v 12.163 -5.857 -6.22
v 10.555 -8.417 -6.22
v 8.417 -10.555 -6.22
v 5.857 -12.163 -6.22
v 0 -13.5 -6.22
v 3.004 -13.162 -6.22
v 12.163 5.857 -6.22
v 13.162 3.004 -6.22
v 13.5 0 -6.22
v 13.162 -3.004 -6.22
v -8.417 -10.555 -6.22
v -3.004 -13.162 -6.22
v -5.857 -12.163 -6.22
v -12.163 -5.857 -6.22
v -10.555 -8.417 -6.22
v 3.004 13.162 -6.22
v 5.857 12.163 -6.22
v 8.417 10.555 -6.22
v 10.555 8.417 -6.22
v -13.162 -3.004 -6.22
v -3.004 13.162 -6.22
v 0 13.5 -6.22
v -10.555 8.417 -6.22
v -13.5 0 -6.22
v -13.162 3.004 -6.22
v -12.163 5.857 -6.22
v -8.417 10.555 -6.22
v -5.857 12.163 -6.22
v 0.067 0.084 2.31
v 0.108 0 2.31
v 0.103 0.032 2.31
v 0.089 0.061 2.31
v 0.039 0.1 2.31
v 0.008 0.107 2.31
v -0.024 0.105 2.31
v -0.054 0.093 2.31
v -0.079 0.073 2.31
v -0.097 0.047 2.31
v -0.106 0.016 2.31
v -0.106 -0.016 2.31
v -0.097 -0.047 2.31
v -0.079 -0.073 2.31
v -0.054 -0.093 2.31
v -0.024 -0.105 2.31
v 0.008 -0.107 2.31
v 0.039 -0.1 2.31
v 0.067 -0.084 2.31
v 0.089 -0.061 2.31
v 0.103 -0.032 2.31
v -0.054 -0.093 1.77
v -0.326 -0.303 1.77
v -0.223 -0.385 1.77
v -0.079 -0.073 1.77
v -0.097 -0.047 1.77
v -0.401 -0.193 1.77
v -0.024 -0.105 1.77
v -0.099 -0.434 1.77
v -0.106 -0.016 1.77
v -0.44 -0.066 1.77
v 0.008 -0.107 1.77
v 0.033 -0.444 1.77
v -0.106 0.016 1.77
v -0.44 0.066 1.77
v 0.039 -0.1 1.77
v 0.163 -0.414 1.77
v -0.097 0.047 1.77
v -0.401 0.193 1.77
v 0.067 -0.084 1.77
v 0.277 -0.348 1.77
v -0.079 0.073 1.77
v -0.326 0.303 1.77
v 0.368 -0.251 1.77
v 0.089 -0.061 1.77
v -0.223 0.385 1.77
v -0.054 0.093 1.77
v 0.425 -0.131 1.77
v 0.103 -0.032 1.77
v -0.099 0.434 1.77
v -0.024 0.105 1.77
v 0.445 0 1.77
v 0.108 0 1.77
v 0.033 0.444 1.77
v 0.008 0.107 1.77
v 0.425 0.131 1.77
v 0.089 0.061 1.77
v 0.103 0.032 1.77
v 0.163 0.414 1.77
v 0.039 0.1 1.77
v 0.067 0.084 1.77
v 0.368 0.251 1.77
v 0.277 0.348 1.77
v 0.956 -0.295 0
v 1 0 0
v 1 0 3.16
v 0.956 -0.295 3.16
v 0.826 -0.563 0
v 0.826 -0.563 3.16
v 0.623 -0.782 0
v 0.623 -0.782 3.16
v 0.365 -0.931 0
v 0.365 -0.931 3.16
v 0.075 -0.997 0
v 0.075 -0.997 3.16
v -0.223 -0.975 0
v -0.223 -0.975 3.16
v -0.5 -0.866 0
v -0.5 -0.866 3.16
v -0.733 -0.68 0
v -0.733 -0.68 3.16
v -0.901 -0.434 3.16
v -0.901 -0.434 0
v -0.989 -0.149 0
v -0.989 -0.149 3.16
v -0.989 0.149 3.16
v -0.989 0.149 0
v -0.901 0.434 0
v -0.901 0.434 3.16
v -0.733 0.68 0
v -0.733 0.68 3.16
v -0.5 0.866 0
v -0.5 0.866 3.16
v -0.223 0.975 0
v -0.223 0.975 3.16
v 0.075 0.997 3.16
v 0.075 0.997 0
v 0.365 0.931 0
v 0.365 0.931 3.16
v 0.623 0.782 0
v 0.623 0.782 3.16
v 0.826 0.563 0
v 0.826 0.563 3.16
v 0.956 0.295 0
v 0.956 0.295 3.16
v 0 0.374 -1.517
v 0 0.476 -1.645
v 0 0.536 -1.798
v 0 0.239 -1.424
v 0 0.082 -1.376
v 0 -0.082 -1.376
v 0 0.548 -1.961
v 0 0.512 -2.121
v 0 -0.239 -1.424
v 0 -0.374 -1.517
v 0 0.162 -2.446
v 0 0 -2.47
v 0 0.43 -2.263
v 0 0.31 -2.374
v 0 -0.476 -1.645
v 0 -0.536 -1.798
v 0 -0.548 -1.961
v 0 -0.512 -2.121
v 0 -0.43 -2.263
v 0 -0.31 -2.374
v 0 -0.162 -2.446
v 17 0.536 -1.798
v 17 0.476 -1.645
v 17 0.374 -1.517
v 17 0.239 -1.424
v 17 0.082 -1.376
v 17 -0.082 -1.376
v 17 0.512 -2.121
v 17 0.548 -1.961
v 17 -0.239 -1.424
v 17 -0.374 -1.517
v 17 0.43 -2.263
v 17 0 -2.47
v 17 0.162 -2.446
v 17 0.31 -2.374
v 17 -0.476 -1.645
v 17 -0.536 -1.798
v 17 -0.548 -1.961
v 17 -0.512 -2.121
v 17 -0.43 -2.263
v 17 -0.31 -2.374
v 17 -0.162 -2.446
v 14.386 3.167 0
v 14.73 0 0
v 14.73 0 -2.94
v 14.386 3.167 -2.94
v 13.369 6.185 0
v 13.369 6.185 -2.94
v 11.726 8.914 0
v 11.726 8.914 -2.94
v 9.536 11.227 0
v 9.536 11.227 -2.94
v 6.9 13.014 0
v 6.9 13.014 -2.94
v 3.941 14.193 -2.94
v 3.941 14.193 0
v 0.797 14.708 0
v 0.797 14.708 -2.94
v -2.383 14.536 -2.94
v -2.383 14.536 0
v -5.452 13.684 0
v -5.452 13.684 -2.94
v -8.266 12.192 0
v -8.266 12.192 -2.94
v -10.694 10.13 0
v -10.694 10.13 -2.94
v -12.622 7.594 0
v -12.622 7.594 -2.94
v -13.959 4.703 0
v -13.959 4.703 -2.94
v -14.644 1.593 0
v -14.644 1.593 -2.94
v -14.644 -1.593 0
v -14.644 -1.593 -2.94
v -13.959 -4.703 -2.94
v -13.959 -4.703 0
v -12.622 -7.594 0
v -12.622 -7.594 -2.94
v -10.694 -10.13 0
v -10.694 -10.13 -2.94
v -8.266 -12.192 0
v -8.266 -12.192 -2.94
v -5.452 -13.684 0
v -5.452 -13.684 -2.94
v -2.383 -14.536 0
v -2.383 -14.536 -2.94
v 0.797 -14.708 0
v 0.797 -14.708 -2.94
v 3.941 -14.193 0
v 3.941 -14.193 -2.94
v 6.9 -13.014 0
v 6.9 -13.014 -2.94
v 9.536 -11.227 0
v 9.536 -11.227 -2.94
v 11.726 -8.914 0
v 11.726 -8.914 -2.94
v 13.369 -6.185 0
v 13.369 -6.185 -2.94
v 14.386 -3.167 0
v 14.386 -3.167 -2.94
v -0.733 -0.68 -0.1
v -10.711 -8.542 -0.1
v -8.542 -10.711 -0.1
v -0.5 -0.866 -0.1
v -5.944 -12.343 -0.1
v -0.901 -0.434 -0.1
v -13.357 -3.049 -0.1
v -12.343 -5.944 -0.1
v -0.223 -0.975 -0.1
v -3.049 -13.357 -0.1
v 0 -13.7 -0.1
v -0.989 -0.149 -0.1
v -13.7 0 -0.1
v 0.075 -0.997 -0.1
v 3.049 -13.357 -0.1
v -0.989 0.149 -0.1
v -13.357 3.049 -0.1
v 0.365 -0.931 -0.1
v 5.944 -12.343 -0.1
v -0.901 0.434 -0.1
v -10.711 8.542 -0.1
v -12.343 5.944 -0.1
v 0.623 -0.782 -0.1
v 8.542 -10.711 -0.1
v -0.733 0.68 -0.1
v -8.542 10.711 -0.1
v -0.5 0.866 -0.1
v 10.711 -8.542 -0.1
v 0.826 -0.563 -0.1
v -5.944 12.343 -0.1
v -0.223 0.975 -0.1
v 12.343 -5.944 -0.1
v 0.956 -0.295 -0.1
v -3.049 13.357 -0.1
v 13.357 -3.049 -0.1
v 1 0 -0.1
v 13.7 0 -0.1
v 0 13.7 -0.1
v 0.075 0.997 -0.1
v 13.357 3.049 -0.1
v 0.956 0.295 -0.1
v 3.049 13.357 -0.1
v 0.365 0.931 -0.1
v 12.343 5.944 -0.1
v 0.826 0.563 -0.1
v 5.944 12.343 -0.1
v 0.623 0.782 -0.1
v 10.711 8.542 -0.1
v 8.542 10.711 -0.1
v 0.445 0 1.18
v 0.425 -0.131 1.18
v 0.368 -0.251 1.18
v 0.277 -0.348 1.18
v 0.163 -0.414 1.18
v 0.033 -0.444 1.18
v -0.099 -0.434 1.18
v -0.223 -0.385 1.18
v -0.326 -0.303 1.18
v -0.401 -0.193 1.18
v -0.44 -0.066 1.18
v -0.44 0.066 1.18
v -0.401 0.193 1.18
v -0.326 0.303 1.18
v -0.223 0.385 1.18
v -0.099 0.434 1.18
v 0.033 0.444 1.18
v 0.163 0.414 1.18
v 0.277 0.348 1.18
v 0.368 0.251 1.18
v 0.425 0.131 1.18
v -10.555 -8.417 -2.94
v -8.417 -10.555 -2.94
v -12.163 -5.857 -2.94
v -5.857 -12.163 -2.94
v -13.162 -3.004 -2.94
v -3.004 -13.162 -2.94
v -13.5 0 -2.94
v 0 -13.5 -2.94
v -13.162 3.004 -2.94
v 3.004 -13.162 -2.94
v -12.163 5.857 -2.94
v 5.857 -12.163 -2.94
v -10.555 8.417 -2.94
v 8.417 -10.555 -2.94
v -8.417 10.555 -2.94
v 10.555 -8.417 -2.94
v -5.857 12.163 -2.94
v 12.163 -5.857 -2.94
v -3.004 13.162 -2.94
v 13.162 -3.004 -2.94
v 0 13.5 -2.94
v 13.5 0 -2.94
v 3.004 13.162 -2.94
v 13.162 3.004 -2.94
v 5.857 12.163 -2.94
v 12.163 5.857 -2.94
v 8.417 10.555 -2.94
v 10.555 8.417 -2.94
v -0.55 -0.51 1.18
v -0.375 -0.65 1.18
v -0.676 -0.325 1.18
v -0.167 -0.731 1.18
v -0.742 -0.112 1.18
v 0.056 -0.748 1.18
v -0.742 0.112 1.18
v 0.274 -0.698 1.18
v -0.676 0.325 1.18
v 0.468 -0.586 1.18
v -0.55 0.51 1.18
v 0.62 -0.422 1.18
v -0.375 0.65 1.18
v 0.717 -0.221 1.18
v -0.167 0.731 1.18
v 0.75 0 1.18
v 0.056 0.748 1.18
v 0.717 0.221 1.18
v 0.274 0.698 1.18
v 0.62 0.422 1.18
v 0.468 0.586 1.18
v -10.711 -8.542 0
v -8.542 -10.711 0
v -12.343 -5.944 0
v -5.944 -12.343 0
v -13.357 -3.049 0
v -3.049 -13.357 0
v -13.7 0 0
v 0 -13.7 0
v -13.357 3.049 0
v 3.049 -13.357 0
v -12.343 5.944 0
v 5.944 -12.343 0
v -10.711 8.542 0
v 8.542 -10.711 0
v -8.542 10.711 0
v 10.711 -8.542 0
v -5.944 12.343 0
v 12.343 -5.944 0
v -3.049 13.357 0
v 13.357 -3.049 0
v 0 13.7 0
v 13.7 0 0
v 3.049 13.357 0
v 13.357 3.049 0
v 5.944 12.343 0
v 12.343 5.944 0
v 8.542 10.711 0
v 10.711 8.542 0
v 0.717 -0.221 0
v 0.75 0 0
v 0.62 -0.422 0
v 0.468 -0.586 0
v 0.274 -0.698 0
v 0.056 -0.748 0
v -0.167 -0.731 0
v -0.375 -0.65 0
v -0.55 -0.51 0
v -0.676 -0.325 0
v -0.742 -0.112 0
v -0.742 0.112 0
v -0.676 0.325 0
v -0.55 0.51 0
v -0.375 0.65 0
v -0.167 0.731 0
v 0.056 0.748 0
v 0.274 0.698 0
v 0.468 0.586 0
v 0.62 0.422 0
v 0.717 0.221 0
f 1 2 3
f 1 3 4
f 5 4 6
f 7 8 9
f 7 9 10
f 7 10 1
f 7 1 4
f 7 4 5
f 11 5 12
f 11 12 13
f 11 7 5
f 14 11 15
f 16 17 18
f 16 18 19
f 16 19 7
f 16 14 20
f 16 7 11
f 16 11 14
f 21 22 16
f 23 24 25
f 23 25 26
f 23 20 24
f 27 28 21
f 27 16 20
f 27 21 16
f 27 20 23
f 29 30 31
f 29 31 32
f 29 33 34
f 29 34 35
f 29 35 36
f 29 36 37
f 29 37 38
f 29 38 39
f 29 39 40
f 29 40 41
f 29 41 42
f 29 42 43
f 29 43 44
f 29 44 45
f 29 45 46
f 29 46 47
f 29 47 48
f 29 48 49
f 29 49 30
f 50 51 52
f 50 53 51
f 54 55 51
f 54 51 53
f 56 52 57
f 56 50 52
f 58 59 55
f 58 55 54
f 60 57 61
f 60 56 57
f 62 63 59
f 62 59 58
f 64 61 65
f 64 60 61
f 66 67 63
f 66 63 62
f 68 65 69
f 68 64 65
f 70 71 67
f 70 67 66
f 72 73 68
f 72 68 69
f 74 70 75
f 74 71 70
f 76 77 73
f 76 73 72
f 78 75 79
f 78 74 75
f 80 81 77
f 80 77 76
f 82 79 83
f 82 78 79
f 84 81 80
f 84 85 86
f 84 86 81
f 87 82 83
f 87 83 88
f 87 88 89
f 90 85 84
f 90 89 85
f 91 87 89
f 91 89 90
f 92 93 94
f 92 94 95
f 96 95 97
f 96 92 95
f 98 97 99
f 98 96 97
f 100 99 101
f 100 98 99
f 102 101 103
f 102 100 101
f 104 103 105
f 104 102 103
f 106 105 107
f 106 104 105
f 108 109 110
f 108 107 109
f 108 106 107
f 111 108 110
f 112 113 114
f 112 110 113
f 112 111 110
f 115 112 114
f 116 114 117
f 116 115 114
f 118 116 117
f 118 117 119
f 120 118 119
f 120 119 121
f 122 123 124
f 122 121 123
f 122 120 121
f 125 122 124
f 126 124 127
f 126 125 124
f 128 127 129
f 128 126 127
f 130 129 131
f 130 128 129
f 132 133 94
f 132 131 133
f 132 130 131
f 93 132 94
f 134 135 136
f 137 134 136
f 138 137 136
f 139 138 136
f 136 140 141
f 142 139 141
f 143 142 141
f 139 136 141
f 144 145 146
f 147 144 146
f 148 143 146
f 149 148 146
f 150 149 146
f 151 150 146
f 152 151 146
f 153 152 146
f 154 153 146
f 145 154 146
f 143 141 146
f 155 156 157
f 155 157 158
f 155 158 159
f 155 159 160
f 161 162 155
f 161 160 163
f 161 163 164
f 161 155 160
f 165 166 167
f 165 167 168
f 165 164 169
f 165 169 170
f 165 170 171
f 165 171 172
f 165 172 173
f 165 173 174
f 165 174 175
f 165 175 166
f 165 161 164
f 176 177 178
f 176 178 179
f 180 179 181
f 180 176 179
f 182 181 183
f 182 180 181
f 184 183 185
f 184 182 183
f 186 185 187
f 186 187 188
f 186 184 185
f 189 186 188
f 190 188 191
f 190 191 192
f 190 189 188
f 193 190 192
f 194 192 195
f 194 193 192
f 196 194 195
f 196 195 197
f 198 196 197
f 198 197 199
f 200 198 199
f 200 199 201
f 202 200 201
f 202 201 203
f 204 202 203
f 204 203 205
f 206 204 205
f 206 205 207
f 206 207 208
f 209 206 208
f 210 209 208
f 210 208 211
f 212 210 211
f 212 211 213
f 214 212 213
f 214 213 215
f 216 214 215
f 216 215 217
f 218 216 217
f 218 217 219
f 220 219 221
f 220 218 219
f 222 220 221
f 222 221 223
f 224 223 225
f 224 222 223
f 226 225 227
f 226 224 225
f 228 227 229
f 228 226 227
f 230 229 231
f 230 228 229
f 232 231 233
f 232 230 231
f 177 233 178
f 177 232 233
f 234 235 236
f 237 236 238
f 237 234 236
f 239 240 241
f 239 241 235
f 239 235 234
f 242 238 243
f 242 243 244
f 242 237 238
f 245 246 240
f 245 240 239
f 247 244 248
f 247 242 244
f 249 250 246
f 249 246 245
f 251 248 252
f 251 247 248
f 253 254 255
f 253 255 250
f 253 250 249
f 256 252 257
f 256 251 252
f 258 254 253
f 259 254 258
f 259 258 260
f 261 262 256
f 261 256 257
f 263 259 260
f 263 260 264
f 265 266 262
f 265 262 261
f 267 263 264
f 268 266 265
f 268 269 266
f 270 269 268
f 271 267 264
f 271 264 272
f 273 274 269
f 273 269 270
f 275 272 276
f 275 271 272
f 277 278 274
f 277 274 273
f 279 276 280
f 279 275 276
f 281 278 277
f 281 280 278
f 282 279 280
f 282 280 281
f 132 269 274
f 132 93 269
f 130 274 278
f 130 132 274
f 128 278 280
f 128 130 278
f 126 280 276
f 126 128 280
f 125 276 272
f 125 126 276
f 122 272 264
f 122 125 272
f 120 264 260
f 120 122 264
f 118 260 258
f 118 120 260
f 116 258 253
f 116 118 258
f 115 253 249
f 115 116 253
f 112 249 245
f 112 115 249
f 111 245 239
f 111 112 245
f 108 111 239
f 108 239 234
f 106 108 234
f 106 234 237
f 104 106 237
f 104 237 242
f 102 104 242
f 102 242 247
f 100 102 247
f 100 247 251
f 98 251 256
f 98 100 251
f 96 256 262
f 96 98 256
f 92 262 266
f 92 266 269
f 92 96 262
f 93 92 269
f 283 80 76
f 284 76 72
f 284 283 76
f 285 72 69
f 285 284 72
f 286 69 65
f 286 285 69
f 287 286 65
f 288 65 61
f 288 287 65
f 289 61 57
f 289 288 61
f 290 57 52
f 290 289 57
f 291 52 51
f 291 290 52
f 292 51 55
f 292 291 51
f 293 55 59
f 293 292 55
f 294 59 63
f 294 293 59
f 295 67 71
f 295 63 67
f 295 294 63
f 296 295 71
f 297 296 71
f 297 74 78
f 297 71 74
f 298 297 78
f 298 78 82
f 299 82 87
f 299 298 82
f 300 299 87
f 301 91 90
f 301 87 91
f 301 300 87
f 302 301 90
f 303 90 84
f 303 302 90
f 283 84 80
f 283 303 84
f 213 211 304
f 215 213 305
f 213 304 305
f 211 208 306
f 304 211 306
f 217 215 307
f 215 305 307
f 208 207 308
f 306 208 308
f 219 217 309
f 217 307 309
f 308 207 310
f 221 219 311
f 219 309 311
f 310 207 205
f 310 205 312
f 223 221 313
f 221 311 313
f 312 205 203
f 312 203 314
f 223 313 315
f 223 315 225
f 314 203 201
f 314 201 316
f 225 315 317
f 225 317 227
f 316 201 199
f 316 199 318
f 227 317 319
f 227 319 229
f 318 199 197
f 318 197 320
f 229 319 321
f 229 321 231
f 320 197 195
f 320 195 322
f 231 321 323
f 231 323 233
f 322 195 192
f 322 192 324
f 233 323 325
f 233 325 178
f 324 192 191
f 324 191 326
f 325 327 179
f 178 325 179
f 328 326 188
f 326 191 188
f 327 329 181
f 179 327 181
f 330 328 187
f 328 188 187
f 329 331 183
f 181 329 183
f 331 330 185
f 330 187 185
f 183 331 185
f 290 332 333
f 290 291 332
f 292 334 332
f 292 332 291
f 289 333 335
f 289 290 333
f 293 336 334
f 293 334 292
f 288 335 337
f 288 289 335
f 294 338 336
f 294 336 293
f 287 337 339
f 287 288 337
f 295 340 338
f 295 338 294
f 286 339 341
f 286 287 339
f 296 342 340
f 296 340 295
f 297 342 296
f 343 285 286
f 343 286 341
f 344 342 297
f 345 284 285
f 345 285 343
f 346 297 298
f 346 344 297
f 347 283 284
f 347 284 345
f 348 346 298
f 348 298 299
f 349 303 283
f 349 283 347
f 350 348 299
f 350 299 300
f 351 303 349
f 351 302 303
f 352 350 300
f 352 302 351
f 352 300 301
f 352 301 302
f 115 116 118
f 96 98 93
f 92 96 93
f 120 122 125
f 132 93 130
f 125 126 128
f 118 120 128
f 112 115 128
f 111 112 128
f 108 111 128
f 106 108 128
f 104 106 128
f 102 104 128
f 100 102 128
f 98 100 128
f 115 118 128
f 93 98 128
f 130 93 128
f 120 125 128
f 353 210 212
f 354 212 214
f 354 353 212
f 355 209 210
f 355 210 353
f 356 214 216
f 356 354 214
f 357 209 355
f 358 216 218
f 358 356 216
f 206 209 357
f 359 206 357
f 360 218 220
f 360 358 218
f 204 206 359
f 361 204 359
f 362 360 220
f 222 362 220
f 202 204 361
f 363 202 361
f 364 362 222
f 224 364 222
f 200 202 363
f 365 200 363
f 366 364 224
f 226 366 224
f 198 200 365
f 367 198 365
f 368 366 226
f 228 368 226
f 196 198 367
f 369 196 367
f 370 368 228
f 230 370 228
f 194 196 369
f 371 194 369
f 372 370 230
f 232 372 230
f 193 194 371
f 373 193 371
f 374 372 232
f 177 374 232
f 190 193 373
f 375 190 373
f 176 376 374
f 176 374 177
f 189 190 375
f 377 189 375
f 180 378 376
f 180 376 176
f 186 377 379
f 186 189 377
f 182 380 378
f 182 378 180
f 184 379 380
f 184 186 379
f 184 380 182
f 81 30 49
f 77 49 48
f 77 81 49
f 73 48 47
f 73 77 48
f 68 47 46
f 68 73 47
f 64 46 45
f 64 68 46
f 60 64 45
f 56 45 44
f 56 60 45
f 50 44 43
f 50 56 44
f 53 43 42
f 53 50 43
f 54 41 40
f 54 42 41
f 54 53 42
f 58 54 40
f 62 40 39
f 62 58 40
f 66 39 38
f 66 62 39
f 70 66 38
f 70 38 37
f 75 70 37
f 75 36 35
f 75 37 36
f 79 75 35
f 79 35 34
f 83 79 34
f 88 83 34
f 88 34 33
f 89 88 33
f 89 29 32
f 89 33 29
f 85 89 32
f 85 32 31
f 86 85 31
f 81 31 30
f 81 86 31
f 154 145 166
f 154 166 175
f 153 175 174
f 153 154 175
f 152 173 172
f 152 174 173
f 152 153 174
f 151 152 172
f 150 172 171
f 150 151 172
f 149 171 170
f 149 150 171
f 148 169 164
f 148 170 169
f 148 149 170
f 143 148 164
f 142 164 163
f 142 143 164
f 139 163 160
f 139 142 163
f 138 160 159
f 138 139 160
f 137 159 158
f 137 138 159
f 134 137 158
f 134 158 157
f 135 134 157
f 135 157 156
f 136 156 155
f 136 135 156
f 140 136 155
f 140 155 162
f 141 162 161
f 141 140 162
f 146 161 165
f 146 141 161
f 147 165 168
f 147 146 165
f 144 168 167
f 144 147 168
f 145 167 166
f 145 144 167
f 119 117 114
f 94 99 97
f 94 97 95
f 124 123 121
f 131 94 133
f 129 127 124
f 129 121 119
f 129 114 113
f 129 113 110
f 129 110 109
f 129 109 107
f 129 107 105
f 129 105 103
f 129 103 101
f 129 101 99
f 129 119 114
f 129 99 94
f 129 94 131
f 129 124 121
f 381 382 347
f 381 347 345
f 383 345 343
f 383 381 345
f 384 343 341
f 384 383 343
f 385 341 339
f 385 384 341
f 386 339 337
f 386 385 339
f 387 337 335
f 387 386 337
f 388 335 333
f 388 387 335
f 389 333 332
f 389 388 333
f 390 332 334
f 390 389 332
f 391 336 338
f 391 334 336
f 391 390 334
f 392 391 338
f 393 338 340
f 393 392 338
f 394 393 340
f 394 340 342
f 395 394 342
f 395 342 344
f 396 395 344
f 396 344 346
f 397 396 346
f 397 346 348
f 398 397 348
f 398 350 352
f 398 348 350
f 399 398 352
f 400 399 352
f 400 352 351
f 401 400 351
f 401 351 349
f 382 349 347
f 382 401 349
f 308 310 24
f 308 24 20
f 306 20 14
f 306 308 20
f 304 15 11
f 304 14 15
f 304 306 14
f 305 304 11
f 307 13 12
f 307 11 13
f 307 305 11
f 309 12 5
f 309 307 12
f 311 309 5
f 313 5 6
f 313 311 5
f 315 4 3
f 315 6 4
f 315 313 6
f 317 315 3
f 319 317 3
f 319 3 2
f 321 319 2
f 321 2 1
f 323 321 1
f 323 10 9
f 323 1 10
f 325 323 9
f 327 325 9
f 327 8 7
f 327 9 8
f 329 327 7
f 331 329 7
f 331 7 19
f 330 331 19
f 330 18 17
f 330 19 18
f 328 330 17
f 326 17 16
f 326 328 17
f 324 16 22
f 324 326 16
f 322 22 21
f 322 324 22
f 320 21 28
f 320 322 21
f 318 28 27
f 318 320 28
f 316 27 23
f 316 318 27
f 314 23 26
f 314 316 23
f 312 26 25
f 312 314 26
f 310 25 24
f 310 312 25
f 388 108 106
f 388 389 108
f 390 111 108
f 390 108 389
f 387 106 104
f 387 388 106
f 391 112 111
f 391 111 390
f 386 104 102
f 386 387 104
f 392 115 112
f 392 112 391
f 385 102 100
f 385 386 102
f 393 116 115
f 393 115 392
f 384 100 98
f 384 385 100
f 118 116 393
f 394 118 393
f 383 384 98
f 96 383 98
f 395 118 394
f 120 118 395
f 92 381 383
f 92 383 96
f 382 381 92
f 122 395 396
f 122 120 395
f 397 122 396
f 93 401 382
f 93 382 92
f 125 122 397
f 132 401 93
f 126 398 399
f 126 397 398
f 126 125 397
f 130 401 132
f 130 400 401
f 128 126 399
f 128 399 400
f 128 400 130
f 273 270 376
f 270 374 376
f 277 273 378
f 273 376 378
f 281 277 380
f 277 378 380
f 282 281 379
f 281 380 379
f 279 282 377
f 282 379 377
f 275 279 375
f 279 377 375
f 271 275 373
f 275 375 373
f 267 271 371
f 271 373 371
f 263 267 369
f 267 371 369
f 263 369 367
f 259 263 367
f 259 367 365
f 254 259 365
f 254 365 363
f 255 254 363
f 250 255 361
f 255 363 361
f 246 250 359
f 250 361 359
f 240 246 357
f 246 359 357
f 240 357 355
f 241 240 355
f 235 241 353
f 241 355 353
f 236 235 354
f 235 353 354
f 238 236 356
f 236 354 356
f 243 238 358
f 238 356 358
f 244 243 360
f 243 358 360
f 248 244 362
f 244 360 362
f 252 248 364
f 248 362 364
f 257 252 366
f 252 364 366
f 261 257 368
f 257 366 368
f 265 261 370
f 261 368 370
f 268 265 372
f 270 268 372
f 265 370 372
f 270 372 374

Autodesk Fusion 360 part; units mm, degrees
sketch "Sketch1" plane through (0, 0, 0) normal (0, 0, 1) x (1, 0, 0) in component "nh38"
  circle A0 centre (0, 0) radius 14.73
  dimension "d1" = 29.46
extrude "Extrude1" add sketch "Sketch1" against normal blind 2.94 makes body 1 in component "nh38"
sketch "Sketch2" plane through (0, 0, -2.94) normal (0, 0, -1) x (-1, 0, 0) in component "nh38"
  circle A0 centre (0, 0) radius 14.73
  circle A1 centre (0, 0) radius 13.5
  dimension "d4" = 27
extrude "Extrude2" add sketch "Sketch2" along normal blind 3.28 contours A1 bodies 1 in component "nh38"
sketch "Sketch3" plane through (0, 0, 0) normal (0, 0, 1) x (1, 0, 0) in component "nh38"
  circle A0 centre (0, 0) radius 14.73
  circle A1 centre (0, 0) radius 0.75
  dimension "d7" = 1.5
extrude "Extrude3" add sketch "Sketch3" along normal blind 1.18 contours A1 bodies 1 in component "nh38"
sketch "Sketch4" plane through (0, 0, 0) normal (0, 0, 1) x (1, 0, 0) in component "nh38"
  circle A0 centre (0, 0) radius 0.75
  circle A1 centre (0, 0) radius 14.73
  circle A2 centre (0, 0) radius 0.445
  dimension "d10" = 0.89
extrude "Extrude4" add sketch "Sketch4" along normal blind 1.77 contours A2 bodies 1 in component "nh38"
sketch "Sketch5" plane through (0, 0, 0) normal (0, 0, 1) x (1, 0, 0) in component "nh38"
  circle A0 centre (0, 0) radius 0.75
  circle A1 centre (0, 0) radius 14.73
  circle A2 centre (0, 0) radius 0.1075
  dimension "d13" = 0.215
extrude "Extrude5" add sketch "Sketch5" along normal blind 2.31 contours A2 bodies 1 in component "nh38"
sketch "Sketch6" plane through (0, 0, 0) normal (0, 0, 1) x (1, 0, 0) in component "nh38"
  circle A0 centre (0, 0) radius 0.75
  circle A1 centre (0, 0) radius 14.73
  circle A2 centre (0, 0) radius 1
  dimension "d16" = 2
extrude "Extrude6" add sketch "Sketch6" along normal blind 3.16 separate body contours A0 | A2 makes body 2 in component "nh38"
sketch "Sketch1 (2)" plane through (0, 0, 0) normal (0, 0, 1) x (1, 0, 0)
  circle A0 centre (0, 0) radius 0.75
  circle A1 centre (0, 0) radius 14.73
  circle A2 centre (0, 0) radius 13.7
  circle A3 centre (0, 0) radius 1
  dimension "d19" = 27.4
  dimension "d20" = 2
extrude "Extrude7" cut sketch "Sketch1 (2)" against normal blind 0.1 contours A2 bodies 1 in component "nh38"
sketch "Sketch2 (2)" plane through (0, 0, 0) normal (1, 0, 0) x (0, 0, -1) in component "nh38"
  line L0 (0, 0) -> (1.92, 0) construction
  circle A0 centre (1.92, 0) radius 0.55
  dimension "d23" = 1.92
  dimension "d24" = 1.1
extrude "Extrude8" add sketch "Sketch2 (2)" along normal blind 17 separate body makes body 3 in component "nh38"
component "seiko-tmi" placed x (1, 0, 0) y (0, 1, 0) z (0, 0, 1) at (0, 0, 0)
component "nh38" placed x (1, 0, 0) y (0, 1, 0) z (0, 0, 1) at (0, 0, 0) in component "seiko-tmi"
equation "d5 = 5.32 mm - 2.94 mm + 0.4 mm + 0.5 mm"
equation "d8 = 0.4 mm + 0.78 mm"
equation "d11 = 0.4 mm + 1.37 mm"
equation "d14 = 0.4 mm + 1.91 mm"
equation "d17 = 0.4 mm + 2.31 mm + 0.45 mm"
